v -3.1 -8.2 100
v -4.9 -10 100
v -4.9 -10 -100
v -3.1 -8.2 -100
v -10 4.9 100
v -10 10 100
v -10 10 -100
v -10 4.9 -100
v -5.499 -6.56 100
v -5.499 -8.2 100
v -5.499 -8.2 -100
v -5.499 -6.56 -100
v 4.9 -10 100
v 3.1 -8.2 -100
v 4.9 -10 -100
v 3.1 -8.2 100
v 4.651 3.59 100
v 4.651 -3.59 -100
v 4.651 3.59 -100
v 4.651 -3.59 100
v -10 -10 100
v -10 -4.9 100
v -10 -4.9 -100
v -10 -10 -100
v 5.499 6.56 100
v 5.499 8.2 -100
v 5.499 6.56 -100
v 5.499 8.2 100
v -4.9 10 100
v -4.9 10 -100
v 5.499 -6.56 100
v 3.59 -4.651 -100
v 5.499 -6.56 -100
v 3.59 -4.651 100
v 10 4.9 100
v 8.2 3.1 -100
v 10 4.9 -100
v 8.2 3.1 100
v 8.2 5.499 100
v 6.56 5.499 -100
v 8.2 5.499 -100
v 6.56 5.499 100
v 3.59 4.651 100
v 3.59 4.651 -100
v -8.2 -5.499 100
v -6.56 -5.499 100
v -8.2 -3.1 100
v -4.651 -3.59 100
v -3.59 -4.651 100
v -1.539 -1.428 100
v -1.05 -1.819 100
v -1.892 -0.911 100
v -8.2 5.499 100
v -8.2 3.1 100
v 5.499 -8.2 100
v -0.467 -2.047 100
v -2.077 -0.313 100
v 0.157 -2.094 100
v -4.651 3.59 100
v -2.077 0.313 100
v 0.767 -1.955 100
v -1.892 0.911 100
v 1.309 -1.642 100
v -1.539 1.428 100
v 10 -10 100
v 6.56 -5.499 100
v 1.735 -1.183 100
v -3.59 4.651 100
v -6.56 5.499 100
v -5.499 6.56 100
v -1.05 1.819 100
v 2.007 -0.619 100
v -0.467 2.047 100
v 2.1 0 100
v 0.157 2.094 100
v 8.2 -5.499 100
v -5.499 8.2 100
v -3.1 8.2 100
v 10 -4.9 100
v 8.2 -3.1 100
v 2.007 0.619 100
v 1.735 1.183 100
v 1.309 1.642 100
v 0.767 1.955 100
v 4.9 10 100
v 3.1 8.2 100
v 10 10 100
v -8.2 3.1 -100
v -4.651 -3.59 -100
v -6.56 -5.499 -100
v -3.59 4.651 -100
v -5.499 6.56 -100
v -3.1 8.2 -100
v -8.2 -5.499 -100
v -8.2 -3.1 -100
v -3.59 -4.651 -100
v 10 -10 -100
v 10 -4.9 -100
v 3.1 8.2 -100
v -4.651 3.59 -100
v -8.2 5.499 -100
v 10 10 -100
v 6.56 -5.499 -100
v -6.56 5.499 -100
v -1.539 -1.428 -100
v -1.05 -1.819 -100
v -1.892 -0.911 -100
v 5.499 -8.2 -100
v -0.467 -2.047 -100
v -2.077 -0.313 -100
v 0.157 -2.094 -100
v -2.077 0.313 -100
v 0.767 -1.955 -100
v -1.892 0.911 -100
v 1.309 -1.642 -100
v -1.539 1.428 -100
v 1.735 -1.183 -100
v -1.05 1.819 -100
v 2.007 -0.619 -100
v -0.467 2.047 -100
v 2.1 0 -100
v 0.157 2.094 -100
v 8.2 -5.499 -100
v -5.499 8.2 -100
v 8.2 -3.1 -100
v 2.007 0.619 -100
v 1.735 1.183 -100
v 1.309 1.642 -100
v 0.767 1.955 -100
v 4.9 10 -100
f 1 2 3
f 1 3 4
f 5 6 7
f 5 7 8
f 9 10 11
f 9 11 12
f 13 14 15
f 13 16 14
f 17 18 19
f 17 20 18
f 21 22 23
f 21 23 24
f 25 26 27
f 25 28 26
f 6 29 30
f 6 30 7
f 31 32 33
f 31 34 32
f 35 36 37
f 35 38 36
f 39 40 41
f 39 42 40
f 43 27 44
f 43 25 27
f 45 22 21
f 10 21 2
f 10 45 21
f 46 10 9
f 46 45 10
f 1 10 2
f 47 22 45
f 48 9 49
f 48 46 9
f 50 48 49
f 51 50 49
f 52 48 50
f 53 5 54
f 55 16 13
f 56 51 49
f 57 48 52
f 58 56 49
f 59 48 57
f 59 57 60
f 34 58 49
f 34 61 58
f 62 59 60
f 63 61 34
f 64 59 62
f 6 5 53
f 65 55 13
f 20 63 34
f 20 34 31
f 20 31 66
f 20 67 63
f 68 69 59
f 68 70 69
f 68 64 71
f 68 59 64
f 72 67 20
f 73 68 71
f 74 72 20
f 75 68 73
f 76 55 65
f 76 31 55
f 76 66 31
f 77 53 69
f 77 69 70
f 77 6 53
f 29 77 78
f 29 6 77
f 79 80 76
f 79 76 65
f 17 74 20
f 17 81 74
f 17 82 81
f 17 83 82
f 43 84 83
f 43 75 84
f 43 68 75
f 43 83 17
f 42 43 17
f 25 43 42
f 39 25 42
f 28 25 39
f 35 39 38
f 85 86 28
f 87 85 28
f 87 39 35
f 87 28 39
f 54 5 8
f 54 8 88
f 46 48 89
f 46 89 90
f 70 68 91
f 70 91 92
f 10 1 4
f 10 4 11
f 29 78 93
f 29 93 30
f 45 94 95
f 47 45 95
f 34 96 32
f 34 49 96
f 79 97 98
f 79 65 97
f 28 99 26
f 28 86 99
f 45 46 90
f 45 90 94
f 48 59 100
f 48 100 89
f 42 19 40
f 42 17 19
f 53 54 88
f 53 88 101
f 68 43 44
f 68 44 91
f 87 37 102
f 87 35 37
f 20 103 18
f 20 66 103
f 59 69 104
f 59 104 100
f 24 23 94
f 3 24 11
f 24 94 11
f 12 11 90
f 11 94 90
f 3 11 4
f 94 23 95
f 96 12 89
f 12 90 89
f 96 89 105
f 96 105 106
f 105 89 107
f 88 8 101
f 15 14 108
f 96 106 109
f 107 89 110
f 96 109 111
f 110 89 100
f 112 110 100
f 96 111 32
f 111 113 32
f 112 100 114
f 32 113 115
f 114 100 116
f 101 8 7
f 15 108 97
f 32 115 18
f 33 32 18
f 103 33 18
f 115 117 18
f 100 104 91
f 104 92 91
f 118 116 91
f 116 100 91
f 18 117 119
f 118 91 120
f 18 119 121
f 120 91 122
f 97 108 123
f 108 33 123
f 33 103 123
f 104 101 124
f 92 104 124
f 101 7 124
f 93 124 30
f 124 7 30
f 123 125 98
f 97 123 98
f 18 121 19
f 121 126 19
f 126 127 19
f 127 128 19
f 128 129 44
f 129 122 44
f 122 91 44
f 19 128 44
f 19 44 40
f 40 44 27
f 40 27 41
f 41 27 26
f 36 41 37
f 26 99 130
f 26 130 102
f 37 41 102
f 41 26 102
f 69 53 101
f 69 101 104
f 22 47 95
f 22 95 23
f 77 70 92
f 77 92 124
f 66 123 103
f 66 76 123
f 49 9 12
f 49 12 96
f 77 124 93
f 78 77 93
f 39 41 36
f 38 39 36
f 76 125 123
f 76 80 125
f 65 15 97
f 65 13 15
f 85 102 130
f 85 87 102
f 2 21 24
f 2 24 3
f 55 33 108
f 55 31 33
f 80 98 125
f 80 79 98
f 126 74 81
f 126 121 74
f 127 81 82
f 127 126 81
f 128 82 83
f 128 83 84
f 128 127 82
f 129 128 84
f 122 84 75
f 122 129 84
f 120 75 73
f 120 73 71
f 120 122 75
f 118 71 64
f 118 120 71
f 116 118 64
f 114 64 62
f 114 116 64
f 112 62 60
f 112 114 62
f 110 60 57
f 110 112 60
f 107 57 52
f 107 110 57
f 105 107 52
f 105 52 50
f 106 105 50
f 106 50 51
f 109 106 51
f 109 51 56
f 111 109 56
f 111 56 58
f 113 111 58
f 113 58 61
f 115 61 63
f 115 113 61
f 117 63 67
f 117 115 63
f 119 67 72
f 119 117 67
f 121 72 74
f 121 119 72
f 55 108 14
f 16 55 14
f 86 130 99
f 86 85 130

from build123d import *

# Parameters (mm, degrees)
SKETCH1_R           = 2.1
BOSS_EXTRUDE1_DEPTH = 100


with BuildPart() as part:
    # Sketch1 → Boss-Extrude1 (new body, symmetric)
    with BuildSketch(Plane.XY):
        Polygon((5.499339828, 6.56), (3.59, 4.650660172), (-3.59, 4.650660172), (-5.499339828, 6.56), (-5.499339828, 8.2), (-3.1, 8.2), (-4.9, 10), (-10, 10), (-10, 4.9), (-8.2, 3.1), (-8.2, 5.499339828), (-6.56, 5.499339828), (-4.650660172, 3.59), (-4.650660172, -3.59), (-6.56, -5.499339828), (-8.2, -5.499339828), (-8.2, -3.1), (-10, -4.9), (-10, -10), (-4.9, -10), (-3.1, -8.2), (-5.499339828, -8.2), (-5.499339828, -6.56), (-3.59, -4.650660172), (3.59, -4.650660172), (5.499339828, -6.56), (5.499339828, -8.2), (3.1, -8.2), (4.9, -10), (10, -10), (10, -4.9), (8.2, -3.1), (8.2, -5.499339828), (6.56, -5.499339828), (4.650660172, -3.59), (4.650660172, 3.59), (6.56, 5.499339828), (8.2, 5.499339828), (8.2, 3.1), (10, 4.9), (10, 10), (4.9, 10), (3.1, 8.2), (5.499339828, 8.2), align=None)
        Circle(SKETCH1_R, mode=Mode.SUBTRACT)
    extrude(amount=BOSS_EXTRUDE1_DEPTH, both=True)


solid = part.part
